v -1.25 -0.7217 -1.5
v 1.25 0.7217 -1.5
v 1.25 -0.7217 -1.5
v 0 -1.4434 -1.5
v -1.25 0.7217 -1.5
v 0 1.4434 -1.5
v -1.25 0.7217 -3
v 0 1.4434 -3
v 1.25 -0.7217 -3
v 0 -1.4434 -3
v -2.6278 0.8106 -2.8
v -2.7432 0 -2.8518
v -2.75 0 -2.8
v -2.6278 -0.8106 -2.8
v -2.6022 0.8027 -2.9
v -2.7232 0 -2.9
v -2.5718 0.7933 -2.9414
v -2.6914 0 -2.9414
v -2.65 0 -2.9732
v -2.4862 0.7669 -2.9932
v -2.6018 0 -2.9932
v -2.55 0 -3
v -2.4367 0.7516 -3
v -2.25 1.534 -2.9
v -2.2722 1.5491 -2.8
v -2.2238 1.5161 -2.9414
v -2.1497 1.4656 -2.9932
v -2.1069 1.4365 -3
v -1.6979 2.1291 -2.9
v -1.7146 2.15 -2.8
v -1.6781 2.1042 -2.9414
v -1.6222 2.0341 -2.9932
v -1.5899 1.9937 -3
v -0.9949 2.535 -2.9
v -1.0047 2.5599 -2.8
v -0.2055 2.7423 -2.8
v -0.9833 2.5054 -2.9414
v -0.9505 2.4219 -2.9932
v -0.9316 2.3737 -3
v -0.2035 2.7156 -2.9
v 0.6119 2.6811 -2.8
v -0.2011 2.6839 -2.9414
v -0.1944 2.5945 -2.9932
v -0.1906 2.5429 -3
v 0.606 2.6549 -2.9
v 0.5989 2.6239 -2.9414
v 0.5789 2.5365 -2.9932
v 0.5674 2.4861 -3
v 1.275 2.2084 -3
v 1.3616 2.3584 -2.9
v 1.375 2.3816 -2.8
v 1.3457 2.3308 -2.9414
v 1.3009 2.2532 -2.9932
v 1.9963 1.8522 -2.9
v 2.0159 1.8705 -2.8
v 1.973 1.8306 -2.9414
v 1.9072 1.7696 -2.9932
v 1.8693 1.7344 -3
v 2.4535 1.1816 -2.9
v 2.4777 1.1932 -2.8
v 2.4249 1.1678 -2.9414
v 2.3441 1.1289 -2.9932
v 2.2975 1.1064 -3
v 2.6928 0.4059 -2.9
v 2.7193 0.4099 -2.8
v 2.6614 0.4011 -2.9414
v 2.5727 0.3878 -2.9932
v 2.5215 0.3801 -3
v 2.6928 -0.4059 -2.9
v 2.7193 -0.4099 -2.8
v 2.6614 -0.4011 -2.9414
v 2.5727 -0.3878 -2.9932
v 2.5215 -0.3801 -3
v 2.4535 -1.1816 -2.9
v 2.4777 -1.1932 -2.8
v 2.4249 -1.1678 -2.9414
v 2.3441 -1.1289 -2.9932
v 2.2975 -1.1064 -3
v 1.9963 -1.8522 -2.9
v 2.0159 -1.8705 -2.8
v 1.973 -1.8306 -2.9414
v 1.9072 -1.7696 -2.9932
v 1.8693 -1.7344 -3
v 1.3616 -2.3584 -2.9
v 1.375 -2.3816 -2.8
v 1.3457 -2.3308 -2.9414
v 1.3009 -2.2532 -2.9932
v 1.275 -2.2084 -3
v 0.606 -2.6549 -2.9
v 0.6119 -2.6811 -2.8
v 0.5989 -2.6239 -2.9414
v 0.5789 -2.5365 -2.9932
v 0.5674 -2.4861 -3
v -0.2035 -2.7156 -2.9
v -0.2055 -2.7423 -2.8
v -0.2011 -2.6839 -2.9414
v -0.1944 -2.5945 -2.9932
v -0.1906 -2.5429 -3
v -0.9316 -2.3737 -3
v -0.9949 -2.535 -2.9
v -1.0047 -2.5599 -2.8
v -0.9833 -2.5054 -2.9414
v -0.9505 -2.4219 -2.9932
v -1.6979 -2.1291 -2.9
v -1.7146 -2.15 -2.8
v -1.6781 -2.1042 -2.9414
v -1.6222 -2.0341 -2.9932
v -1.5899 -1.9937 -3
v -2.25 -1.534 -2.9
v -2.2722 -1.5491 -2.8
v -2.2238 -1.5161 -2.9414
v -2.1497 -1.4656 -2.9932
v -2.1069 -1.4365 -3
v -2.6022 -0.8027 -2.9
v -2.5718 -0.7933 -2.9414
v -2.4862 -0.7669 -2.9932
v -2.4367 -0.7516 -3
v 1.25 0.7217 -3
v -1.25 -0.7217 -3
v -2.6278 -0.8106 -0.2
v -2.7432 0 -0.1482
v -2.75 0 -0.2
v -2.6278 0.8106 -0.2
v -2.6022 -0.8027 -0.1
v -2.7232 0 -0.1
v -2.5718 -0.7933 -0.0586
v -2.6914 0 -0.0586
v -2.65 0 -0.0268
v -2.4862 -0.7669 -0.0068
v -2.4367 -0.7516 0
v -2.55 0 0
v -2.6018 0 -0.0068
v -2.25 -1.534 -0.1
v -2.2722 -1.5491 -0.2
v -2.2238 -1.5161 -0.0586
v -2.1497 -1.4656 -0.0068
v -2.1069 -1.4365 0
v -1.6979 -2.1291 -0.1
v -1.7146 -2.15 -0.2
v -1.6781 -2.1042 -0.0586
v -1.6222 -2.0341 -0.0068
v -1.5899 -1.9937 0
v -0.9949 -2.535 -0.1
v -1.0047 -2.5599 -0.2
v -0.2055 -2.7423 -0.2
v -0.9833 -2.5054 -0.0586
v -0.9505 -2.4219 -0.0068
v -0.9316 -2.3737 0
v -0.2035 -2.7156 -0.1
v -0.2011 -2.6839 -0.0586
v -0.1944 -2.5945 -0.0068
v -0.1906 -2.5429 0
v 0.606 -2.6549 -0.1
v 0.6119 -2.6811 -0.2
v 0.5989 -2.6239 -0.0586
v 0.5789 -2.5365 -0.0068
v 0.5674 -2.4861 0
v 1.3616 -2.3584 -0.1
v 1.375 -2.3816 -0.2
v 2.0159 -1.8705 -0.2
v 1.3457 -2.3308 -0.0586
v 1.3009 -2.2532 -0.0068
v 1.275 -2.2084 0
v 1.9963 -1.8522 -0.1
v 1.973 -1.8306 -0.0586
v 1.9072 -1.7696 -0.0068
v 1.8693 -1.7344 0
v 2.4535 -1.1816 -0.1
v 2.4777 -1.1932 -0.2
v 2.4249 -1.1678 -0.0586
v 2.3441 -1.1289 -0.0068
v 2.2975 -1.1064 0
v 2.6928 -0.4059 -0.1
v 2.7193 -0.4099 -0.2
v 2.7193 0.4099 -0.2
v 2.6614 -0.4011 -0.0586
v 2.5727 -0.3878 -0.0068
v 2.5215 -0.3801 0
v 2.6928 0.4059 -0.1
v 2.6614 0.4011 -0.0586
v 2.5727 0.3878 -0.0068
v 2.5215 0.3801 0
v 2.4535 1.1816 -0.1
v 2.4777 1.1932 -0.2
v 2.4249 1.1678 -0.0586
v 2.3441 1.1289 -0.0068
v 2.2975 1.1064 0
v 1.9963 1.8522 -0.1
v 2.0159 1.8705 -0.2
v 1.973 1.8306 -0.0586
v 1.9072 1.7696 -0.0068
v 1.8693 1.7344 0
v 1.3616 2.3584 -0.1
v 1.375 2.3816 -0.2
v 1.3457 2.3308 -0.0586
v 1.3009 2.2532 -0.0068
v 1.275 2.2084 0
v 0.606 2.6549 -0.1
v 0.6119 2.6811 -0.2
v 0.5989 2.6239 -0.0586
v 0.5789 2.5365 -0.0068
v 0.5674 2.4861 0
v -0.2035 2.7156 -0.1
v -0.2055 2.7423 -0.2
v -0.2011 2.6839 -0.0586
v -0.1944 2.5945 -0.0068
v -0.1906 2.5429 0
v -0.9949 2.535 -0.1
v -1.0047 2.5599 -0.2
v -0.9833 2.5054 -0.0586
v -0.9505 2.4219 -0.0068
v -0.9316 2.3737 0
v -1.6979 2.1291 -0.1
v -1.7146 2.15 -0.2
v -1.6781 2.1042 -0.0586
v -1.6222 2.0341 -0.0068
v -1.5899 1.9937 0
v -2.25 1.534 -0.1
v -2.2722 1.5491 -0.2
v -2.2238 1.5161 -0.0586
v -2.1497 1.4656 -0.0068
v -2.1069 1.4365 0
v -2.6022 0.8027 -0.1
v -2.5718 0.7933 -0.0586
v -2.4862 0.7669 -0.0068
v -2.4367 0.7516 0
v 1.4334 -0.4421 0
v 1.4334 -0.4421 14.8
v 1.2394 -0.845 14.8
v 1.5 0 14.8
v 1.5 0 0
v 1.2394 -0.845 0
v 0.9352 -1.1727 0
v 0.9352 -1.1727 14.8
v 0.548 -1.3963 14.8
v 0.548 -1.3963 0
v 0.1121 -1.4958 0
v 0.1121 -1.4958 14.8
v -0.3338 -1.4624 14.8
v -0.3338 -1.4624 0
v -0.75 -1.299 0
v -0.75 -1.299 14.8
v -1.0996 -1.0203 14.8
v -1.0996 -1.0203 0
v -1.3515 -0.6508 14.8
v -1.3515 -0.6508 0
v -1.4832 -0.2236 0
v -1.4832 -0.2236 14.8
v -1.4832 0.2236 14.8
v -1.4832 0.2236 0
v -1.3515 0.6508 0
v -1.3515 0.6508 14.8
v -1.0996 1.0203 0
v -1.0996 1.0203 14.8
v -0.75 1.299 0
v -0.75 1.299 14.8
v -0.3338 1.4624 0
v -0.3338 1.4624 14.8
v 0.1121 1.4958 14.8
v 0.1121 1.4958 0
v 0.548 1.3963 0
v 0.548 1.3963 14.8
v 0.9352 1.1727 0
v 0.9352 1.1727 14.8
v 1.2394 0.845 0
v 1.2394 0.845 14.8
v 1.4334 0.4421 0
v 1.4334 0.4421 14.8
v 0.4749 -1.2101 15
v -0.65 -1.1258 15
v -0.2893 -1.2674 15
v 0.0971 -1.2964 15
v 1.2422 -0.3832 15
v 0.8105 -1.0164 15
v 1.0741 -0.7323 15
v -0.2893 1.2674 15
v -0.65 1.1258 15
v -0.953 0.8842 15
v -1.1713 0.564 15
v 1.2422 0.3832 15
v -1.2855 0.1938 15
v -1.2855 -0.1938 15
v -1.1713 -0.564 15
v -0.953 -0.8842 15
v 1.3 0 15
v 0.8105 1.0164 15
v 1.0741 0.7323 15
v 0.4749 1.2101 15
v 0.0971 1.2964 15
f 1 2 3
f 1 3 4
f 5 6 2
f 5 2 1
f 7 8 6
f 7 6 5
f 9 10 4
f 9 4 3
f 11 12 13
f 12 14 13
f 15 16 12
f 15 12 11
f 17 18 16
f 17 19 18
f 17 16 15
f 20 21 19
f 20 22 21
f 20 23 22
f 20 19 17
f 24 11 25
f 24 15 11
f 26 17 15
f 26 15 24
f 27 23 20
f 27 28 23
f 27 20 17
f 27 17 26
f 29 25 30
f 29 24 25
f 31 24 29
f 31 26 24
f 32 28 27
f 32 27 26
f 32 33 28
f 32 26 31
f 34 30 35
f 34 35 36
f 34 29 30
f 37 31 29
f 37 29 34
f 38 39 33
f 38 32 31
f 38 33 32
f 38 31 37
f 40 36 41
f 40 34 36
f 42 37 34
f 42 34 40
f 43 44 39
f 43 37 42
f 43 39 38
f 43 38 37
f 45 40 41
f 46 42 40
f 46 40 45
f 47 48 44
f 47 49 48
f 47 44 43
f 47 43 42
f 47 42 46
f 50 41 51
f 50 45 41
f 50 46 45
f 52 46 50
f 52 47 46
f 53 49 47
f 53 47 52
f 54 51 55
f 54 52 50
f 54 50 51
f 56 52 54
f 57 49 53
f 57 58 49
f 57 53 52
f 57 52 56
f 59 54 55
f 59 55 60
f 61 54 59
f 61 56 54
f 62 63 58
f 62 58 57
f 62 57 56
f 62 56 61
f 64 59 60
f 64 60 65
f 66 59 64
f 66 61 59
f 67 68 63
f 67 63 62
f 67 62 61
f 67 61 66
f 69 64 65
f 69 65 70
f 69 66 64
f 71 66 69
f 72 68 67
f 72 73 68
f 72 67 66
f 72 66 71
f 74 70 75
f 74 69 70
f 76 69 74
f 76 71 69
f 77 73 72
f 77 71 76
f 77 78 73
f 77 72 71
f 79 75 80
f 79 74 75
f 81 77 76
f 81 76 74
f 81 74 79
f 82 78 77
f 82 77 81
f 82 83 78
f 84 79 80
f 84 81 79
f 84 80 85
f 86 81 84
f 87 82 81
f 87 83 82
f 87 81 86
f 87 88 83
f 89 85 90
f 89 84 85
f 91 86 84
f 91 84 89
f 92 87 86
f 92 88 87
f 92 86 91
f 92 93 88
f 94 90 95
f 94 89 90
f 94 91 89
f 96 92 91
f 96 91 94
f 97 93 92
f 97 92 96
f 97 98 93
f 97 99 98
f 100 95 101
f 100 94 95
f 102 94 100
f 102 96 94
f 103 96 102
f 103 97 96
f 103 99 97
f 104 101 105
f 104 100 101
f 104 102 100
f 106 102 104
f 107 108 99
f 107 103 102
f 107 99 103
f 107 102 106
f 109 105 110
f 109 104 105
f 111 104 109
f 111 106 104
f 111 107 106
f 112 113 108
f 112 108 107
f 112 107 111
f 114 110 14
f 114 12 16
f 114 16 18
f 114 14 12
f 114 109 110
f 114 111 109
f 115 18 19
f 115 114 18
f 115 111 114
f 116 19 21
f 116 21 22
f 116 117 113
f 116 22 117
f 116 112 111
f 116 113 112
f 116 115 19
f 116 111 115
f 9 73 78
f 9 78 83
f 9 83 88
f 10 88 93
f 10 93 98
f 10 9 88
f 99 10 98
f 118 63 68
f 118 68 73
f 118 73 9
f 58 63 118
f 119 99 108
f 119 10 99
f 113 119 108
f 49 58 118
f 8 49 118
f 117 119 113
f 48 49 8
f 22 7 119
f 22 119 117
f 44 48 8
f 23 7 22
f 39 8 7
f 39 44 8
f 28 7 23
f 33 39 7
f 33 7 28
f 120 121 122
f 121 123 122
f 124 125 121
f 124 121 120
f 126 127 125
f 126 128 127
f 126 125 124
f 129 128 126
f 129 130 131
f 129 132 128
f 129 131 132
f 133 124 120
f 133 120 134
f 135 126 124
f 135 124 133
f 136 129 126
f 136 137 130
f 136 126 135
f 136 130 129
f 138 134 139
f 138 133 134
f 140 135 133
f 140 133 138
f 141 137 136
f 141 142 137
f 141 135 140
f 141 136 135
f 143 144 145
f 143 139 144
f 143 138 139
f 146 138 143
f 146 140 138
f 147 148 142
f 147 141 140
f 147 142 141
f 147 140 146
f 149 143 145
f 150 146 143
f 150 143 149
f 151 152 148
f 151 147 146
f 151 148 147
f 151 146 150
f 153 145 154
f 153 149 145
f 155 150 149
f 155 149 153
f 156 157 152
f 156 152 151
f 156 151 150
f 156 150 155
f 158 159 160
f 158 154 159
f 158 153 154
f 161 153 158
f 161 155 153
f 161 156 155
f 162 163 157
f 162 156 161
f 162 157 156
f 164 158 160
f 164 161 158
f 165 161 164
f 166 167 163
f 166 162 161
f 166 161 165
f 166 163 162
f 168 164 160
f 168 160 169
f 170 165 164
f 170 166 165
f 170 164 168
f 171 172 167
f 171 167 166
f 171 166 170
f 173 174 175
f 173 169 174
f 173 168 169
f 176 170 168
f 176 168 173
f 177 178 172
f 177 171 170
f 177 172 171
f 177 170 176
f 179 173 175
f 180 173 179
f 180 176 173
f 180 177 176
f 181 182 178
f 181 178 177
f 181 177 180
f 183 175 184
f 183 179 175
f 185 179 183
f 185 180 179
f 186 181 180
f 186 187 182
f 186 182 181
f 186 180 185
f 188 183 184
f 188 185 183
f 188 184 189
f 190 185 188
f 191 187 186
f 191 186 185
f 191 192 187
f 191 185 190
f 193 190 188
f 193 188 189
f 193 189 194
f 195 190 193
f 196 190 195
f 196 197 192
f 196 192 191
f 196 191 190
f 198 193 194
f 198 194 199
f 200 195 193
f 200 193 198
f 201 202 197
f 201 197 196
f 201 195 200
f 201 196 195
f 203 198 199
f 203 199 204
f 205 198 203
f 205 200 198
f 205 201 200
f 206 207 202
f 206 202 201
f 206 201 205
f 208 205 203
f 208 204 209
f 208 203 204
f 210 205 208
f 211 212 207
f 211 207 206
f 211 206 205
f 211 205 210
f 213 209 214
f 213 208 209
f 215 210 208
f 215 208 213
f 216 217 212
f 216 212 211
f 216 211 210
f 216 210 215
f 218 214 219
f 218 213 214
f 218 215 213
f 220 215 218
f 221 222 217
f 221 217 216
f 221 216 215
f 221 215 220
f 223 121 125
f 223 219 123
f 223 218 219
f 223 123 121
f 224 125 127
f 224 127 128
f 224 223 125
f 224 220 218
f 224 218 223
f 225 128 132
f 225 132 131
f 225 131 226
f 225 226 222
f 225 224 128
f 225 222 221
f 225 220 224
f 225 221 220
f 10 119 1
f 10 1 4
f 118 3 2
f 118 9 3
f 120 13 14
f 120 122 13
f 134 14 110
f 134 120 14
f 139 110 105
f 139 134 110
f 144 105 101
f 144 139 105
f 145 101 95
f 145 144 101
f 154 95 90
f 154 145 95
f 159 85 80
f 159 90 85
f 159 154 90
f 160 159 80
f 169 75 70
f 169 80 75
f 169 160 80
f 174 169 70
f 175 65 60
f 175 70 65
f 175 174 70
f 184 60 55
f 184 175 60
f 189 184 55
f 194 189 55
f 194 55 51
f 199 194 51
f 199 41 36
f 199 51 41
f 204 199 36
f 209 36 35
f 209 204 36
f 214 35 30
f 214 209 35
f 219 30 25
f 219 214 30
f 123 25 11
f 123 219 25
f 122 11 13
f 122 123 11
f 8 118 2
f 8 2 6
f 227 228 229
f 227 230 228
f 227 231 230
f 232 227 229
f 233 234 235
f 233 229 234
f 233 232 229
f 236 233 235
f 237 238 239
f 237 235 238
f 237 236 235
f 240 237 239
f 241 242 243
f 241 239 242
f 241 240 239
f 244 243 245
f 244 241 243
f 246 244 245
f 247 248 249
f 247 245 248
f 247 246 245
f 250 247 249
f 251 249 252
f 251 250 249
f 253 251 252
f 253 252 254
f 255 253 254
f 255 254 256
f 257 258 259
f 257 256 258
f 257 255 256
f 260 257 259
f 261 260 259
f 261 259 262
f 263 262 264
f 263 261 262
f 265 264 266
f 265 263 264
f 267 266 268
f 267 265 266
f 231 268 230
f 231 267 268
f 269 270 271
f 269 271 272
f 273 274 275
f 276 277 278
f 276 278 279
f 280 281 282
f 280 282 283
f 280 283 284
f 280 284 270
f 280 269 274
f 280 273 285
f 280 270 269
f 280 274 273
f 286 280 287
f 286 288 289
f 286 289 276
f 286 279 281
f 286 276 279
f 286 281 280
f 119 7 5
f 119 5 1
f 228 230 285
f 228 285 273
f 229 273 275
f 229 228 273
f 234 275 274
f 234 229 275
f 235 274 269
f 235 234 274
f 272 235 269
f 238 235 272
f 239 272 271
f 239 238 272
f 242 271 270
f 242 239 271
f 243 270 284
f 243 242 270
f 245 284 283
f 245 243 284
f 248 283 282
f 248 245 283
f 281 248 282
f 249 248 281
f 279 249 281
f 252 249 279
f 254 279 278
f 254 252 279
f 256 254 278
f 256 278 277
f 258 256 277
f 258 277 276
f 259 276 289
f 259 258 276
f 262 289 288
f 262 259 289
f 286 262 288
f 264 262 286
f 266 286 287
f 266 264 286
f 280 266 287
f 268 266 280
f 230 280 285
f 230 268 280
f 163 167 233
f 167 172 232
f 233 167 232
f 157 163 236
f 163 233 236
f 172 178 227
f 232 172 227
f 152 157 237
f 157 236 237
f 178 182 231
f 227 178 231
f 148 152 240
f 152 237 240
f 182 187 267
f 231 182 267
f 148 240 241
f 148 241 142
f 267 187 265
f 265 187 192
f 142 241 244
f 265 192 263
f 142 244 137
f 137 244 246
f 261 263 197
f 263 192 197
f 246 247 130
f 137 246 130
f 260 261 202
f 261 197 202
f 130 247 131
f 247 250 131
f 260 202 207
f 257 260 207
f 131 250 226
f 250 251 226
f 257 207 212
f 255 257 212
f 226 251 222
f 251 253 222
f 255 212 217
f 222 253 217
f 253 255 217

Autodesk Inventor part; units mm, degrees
ref_plane "YZ Plane" through (0, 0, 0) normal (1, 0, 0) x (0, 1, 0)
ref_plane "XZ Plane" through (0, 0, 0) normal (0, 1, 0) x (-1, 0, 0)
ref_plane "XY Plane" through (0, 0, 0) normal (0, 0, 1) x (1, 0, 0)
sketch "스케치1" plane through (0, 0, 0) normal (0, 0, 1) x (1, 0, 0)
  circle A0 centre (0, 0) radius 1.5
  dimension "d0" = 3
extrude "돌출1" add sketch "스케치1" along normal blind 15
chamfer "모따기1" distance 0.2 angle 45 1 edges at (-1.5, 0, 15)
sketch "스케치2" plane through (0, 0, 0) normal (0, 0, -1) x (-1, 0, 0)
  circle A0 centre (0, 0) radius 2.75
  dimension "d6" = 5.5
extrude "돌출2" add sketch "스케치2" along normal blind 3
fillet "모깎기1" radius 0.2 2 edges at (2.75, 0, 0) (2.75, 0, -3)
sketch "스케치3" plane through (0, 0, -3) normal (0, 0, -1) x (-1, 0, 0)
  line L0 (0, 1.4434) -> (1.25, 0.7217)
  line L1 (1.25, 0.7217) -> (1.25, -0.7217)
  line L2 (1.25, -0.7217) -> (0, -1.4434)
  line L3 (0, -1.4434) -> (-1.25, -0.7217)
  line L4 (-1.25, -0.7217) -> (-1.25, 0.7217)
  line L5 (-1.25, 0.7217) -> (0, 1.4434)
  point P0 (0, 0)
  point P1 (0, 0)
  point P2 (-1.25, 0)
  dimension "d10" = 2.5
extrude "돌출3" cut sketch "스케치3" against normal blind 1.5
thread "스레드1" size "M3x0.5" class "6g" standard "ANSI Metric M Profile" full length
properties part number "육각렌치볼트 m3 15mm"
